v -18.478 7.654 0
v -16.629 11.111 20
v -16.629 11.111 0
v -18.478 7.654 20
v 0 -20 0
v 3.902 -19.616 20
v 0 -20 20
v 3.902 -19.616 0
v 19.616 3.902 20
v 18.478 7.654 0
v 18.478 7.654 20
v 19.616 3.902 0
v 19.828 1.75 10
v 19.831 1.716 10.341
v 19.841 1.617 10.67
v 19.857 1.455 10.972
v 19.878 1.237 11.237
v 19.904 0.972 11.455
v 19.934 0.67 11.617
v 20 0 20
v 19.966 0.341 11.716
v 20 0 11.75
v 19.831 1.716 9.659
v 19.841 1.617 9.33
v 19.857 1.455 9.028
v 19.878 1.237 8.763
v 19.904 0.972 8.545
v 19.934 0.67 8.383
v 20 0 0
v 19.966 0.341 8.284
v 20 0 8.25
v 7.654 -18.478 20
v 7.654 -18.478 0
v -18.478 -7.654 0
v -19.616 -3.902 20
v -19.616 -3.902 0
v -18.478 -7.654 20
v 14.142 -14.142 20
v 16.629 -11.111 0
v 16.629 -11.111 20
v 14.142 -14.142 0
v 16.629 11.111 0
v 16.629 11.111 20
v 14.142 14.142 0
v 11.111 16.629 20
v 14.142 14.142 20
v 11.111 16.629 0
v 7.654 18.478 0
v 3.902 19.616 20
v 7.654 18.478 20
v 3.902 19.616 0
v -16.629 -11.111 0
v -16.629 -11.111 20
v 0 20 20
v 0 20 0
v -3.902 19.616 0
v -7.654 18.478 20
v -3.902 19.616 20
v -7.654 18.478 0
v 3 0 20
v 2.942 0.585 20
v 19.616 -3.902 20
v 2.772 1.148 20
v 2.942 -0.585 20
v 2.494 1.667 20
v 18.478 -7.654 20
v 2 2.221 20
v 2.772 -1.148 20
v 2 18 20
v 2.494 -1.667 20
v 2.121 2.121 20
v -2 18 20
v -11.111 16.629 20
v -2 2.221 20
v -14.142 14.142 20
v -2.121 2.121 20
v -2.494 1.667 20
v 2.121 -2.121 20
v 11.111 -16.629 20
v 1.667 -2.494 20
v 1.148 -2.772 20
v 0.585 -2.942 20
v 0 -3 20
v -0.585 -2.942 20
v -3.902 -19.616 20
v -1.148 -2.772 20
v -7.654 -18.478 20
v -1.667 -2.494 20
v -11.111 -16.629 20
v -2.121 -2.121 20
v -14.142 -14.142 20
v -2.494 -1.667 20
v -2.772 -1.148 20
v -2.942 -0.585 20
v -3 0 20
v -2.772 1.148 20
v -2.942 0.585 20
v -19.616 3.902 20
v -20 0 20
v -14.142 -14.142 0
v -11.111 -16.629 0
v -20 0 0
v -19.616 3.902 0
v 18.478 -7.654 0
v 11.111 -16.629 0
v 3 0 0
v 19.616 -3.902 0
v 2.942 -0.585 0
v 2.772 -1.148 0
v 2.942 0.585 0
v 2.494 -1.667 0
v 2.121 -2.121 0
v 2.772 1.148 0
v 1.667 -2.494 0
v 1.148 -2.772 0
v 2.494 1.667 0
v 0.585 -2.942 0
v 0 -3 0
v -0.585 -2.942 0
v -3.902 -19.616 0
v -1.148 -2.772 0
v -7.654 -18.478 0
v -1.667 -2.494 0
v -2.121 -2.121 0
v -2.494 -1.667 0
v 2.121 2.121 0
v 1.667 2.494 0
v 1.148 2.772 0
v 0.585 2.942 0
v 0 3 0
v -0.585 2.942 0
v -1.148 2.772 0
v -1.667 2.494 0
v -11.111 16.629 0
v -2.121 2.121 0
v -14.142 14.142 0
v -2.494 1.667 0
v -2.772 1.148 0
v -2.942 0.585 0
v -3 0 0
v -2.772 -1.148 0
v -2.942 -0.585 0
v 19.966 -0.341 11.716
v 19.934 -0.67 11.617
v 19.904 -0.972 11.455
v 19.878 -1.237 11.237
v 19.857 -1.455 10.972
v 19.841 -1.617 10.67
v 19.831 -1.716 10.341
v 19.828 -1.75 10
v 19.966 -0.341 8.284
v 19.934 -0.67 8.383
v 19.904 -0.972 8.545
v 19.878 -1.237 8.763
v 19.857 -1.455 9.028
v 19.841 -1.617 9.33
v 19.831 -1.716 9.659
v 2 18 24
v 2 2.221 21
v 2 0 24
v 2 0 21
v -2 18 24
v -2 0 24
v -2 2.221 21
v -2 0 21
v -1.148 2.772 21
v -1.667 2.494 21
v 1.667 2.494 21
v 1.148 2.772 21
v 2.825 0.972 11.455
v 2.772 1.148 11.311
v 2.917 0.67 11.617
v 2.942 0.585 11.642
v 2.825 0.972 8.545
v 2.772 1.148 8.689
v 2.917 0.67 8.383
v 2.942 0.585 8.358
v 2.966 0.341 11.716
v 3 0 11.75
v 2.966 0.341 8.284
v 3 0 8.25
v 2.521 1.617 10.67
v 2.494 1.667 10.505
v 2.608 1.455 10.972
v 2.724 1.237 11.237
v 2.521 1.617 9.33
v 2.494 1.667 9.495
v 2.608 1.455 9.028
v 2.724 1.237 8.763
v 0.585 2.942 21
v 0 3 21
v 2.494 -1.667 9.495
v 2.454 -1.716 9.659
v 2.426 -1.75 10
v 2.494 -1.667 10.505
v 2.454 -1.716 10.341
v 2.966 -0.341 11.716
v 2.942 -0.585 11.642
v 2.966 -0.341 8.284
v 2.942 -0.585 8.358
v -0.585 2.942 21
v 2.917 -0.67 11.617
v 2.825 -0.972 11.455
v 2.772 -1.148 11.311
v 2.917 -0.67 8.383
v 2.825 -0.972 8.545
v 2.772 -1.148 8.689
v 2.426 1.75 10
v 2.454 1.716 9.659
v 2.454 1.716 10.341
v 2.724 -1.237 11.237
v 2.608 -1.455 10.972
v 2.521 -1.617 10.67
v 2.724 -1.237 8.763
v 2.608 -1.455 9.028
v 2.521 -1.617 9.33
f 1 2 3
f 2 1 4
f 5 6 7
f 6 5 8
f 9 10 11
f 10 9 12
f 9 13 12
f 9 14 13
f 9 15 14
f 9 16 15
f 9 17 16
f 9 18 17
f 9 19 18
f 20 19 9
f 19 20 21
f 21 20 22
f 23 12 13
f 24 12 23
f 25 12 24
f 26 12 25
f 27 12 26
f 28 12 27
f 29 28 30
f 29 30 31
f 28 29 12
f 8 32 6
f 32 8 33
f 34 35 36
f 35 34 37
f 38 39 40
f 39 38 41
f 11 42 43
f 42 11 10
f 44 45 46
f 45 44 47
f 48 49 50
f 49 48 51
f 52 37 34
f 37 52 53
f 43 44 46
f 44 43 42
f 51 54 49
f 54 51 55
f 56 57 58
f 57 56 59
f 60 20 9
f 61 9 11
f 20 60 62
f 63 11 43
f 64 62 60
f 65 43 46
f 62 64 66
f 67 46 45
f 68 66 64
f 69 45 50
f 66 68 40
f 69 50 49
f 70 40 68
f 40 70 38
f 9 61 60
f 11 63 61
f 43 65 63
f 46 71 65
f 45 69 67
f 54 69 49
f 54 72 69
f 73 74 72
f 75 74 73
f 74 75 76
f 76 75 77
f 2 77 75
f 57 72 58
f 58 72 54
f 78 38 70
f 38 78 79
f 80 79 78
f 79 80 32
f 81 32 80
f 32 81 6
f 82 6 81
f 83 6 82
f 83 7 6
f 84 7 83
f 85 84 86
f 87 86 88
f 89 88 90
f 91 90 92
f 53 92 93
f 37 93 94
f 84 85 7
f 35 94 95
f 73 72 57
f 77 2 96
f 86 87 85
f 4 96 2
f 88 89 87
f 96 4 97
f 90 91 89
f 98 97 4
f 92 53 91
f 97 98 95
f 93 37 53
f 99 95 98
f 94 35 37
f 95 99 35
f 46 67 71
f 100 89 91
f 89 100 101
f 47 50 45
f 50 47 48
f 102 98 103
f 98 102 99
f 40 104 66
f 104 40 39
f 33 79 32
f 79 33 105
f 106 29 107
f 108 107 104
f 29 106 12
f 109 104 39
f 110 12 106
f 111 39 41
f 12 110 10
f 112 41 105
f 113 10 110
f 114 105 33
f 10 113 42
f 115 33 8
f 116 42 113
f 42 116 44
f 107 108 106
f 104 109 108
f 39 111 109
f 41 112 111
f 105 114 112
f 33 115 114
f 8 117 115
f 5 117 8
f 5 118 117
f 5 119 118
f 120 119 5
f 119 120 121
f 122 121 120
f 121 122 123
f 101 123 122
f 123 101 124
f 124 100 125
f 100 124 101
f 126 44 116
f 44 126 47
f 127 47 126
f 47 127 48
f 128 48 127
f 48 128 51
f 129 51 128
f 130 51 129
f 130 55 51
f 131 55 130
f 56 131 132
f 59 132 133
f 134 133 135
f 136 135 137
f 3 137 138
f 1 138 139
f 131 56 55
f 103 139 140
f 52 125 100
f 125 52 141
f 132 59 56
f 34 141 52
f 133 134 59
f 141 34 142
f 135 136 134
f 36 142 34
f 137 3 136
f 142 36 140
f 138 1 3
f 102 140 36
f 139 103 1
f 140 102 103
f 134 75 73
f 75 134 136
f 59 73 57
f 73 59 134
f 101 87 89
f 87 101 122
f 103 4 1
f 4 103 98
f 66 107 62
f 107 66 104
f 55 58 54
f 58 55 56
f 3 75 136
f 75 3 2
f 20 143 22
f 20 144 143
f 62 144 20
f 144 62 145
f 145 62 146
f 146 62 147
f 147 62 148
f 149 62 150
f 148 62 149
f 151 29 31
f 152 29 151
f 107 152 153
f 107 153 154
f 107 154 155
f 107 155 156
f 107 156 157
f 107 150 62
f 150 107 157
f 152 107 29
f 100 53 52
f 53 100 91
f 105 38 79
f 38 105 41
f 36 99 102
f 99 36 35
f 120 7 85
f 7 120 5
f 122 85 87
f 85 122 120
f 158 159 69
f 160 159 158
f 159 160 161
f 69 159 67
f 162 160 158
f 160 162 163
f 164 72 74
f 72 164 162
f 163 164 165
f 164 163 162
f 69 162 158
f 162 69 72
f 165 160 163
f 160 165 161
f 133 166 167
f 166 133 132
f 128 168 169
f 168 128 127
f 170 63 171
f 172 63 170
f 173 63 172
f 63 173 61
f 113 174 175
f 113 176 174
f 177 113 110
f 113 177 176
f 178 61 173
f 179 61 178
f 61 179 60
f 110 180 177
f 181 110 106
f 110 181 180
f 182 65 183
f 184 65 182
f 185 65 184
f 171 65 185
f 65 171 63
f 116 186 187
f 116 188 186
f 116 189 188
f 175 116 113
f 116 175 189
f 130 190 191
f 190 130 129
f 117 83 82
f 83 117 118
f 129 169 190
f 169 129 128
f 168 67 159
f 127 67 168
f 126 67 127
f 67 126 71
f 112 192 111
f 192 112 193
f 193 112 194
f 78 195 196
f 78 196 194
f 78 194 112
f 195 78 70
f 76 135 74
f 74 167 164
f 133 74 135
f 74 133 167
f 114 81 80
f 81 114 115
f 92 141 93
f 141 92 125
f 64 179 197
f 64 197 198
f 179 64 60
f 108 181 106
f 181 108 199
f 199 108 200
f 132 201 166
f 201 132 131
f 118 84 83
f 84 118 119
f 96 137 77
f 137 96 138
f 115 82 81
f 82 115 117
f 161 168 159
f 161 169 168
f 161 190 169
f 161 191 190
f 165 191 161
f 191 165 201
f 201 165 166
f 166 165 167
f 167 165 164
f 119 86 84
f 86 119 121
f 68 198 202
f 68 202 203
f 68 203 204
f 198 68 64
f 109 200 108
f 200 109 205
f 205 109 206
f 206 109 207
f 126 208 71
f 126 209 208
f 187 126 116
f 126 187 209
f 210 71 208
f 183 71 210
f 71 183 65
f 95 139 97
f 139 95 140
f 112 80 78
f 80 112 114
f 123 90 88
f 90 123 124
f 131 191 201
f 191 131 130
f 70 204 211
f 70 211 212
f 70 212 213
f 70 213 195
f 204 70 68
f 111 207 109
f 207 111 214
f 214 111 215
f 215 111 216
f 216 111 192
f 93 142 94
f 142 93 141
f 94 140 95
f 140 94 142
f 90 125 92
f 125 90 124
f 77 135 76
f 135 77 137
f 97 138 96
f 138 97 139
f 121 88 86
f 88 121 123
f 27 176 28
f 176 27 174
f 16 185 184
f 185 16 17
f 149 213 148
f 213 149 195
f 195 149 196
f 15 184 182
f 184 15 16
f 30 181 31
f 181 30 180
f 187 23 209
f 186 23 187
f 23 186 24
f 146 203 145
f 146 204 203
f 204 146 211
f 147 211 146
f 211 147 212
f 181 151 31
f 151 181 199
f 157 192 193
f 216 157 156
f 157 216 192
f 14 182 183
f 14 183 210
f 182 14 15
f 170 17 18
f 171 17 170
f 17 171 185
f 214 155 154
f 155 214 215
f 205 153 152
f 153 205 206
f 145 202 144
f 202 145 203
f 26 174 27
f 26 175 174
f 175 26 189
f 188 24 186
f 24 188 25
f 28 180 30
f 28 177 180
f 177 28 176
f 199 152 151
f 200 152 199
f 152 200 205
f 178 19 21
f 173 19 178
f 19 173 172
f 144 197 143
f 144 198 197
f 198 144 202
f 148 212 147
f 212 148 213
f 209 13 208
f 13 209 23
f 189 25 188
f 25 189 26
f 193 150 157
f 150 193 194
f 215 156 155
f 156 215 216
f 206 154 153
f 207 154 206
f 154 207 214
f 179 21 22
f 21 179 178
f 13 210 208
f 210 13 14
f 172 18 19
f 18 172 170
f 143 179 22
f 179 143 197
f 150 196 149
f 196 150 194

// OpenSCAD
$fn = 32;

// ----------------------------------------------------------------------
// Control knob: pointer knob
// ----------------------------------------------------------------------

// --- parameters (mm) ---
rib_w = 4;                // pointer rib width
rib_h = 5;                // pointer rib height
knob_d = 40;              // knob body diameter
knob_h = 20;              // knob body height
bore_d = 6;               // shaft bore diameter
set_d = 3.5;              // set screw bore diameter

rib_poke = rib_h - 1;  // rib height above the top
total_h = knob_h + rib_h - 1;  // overall height

difference() {
  union() {
    cylinder(h = knob_h, d = knob_d);
    translate([-rib_w / 2, 0, knob_h - 1])
      cube([rib_w, knob_d / 2 - 2, rib_h]);
  }
  translate([0, 0, -1]) cylinder(h = knob_h + 2, d = bore_d);
  translate([-1, 0, knob_h / 2]) rotate([0, 90, 0])
    cylinder(h = knob_d / 2 + bore_d / 2 + 2, d = set_d);}
